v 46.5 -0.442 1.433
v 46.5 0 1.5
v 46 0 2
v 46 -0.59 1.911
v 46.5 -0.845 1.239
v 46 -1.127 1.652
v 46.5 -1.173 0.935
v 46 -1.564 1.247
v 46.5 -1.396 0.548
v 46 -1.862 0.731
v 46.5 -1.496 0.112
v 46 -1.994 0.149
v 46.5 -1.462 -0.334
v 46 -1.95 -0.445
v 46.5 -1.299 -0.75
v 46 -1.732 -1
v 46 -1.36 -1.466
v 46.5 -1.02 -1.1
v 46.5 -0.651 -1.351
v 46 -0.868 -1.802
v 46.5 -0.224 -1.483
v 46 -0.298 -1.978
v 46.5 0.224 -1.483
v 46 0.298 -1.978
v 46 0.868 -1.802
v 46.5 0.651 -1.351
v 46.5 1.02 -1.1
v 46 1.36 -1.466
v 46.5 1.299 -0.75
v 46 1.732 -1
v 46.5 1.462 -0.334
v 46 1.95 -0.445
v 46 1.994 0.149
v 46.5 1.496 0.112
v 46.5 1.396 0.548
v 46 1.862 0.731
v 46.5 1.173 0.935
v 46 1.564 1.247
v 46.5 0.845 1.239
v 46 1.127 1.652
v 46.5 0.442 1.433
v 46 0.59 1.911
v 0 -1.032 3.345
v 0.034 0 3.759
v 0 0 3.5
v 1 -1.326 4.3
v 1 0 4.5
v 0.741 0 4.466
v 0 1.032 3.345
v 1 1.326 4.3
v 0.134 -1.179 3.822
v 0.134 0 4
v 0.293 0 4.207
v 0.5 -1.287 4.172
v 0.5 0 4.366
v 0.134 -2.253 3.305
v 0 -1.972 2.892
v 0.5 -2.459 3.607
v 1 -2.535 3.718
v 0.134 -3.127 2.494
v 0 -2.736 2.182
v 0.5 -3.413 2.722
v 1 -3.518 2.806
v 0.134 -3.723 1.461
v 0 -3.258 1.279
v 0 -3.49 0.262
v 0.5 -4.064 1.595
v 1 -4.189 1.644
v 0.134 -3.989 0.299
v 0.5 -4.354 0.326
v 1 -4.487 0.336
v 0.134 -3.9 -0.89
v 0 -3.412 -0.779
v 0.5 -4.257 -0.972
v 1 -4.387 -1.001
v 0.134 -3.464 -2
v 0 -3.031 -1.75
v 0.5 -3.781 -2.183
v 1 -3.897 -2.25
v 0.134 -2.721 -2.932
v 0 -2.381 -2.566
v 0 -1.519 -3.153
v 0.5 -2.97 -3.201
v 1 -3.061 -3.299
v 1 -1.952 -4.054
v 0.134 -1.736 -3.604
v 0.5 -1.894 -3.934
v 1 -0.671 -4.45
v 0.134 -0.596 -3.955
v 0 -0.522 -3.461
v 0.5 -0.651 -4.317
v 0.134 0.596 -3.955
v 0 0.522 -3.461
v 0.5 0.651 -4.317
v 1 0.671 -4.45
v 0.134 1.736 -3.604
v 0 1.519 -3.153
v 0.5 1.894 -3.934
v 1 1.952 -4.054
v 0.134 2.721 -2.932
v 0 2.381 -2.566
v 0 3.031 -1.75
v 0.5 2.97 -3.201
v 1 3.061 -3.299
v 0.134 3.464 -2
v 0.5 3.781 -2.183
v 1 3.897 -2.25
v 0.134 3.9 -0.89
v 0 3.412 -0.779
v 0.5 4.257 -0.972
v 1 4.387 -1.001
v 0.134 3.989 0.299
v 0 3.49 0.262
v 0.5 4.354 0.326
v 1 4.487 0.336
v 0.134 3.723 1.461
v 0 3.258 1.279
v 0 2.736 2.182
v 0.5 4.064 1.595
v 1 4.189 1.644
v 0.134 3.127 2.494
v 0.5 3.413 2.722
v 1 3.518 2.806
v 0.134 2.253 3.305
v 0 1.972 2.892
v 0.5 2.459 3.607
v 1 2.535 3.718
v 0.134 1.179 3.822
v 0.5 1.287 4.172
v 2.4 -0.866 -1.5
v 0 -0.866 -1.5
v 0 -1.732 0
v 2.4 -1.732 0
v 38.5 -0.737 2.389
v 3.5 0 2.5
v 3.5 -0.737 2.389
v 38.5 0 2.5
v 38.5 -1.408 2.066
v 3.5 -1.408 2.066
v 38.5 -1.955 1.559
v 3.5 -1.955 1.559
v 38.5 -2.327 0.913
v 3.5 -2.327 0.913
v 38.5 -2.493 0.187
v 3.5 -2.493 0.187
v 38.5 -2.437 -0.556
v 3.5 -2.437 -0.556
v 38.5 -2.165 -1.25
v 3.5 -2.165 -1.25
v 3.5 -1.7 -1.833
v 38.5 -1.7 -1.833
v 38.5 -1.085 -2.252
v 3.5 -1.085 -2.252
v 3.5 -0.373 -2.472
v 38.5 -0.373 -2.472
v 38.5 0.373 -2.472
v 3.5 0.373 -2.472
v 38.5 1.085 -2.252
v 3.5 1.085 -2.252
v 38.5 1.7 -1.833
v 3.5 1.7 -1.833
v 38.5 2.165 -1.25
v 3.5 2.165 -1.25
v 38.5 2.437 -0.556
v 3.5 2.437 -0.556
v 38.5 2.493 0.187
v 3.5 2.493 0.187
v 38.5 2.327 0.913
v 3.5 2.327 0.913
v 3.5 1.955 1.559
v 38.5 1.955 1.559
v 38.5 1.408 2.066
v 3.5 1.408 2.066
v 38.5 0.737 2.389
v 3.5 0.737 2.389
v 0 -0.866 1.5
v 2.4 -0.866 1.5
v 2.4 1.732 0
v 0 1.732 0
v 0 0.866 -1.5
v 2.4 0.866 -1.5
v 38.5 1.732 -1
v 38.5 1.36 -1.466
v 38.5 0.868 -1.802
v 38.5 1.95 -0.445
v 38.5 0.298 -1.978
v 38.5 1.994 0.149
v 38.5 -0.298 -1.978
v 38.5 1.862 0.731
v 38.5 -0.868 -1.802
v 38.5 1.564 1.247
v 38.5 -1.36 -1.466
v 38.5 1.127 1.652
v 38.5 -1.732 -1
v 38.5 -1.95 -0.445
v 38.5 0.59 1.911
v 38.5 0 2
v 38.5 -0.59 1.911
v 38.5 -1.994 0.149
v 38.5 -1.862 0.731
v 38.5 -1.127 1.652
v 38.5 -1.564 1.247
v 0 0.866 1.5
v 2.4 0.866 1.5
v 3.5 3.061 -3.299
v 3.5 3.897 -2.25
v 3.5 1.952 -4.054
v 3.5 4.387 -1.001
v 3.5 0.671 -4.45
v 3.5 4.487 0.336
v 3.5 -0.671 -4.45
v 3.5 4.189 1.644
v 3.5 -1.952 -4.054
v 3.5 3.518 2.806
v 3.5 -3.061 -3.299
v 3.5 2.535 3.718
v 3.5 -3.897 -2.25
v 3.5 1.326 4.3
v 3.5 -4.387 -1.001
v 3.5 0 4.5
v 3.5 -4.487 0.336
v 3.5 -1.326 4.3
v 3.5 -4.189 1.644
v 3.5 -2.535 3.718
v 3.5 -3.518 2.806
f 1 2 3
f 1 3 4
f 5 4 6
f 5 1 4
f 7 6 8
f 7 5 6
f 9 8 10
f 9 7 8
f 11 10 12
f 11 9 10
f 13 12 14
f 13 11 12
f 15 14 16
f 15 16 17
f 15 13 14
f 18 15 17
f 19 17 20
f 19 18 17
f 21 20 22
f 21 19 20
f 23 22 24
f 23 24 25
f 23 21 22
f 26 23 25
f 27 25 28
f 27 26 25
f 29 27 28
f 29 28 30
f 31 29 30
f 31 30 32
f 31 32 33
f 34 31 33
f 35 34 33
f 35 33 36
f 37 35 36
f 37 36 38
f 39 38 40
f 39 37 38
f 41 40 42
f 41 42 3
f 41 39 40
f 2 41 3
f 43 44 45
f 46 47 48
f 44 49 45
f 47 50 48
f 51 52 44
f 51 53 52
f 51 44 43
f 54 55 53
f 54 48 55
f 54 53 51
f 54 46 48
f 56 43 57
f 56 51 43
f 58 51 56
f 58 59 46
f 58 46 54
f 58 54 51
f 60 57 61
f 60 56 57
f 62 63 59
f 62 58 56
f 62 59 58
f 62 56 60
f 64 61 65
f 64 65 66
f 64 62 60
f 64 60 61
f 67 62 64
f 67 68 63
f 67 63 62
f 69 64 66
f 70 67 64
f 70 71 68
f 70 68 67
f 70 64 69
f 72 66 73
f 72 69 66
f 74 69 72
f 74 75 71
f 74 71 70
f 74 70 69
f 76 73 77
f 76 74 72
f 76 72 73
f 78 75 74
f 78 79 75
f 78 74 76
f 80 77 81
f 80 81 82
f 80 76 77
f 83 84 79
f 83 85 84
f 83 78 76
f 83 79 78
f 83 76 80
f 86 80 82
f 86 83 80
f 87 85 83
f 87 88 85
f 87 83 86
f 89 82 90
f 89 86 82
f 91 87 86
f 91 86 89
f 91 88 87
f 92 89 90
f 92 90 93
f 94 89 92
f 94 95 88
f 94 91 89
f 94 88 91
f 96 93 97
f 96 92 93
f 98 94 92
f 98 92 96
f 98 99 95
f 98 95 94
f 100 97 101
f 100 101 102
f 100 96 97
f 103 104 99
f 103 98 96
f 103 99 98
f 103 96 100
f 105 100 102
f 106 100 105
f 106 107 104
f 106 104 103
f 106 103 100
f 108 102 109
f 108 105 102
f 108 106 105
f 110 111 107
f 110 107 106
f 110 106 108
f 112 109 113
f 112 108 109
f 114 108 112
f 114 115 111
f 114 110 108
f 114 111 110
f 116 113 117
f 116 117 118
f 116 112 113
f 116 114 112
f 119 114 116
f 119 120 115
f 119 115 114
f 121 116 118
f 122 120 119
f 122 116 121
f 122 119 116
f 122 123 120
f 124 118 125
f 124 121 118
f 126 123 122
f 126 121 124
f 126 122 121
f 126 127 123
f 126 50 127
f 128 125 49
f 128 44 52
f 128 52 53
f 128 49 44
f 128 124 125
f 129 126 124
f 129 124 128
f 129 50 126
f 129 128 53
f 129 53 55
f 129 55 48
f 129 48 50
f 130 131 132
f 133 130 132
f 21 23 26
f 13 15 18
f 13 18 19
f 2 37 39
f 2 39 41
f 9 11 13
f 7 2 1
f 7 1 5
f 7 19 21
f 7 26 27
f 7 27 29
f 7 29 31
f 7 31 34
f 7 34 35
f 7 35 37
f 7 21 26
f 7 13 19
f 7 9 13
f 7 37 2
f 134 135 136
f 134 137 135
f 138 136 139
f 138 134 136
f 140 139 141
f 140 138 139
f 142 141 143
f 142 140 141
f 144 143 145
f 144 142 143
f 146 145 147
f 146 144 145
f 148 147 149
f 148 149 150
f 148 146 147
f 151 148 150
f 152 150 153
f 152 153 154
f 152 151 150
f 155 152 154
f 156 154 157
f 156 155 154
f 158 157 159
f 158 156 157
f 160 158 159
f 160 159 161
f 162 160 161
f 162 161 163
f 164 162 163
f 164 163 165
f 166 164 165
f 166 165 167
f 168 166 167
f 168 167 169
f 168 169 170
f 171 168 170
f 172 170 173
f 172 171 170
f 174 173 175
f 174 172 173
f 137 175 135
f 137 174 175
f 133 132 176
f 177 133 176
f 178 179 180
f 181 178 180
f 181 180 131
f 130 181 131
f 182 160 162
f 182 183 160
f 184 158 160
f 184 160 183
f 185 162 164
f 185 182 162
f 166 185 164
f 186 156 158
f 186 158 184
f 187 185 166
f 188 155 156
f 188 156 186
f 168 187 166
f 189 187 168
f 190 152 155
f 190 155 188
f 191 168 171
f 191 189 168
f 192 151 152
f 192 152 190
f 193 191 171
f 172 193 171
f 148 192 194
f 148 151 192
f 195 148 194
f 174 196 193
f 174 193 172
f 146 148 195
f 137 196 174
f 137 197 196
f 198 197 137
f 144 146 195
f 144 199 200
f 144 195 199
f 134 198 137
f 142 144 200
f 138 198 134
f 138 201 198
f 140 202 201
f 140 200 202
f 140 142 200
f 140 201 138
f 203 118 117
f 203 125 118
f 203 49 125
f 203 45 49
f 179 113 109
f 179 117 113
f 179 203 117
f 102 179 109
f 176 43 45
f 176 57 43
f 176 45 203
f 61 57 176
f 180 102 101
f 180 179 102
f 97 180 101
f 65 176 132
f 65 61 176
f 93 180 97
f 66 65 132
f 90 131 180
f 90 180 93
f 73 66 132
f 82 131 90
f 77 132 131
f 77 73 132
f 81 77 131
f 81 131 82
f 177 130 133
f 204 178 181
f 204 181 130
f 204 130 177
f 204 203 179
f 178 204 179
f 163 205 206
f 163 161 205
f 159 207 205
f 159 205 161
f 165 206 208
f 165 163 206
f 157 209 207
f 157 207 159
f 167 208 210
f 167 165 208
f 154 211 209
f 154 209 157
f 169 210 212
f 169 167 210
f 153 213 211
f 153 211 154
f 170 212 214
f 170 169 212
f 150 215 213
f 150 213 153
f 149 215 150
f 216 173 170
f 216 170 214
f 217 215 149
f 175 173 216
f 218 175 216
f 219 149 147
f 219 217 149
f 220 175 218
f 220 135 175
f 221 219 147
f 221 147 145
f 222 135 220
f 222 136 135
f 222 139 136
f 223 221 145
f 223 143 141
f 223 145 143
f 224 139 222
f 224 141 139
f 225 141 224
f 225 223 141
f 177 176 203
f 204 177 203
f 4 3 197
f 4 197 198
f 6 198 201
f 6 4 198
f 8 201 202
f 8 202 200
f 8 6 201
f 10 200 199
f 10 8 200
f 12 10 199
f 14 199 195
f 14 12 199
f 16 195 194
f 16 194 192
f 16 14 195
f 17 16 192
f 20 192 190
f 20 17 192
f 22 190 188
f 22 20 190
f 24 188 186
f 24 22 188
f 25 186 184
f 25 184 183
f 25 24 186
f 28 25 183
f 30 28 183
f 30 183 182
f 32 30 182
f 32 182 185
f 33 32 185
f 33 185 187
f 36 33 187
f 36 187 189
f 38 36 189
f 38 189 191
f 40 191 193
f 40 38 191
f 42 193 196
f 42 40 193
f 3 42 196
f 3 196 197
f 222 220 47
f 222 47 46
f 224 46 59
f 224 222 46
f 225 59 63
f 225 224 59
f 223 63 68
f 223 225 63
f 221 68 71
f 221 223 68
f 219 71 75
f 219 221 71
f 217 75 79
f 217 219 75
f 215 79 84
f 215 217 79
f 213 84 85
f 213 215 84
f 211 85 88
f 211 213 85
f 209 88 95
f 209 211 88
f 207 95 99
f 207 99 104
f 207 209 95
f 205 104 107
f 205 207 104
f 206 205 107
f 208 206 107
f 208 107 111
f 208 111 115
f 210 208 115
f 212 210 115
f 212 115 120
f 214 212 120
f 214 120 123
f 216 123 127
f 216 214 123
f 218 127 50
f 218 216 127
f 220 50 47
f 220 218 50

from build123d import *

# Parameters (mm, degrees)
CUT_EXTRUDE_1_DEPTH = 2.4
FILLET_1_R          = 1
CHAMFER_1_SIZE      = 0.5


with BuildPart() as part:
    # 草图1 → 旋转1 (revolve)
    with BuildSketch(Plane.XY, mode=Mode.PRIVATE) as revolve_1_sk:
        Polygon((0, 0), (0, 4.5), (3.5, 4.5), (3.5, 2.5), (38.5, 2.5), (38.5, 2), (46.5, 2), (46.5, 0), align=None)
    revolve(revolve_1_sk.sketch.rotate(Axis((0, 0, 0), (1, 0, 0)), 90), axis=Axis((0, 0, 0), (1, 0, 0)))

    # 草图2 → 切除-拉伸1 (cut)
    with BuildSketch(Plane.ZY):
        Polygon((0, 1.732050808), (-1.5, 0.866025404), (-1.5, -0.866025404), (0, -1.732050808), (1.5, -0.866025404), (1.5, 0.866025404), align=None)
    extrude(amount=-CUT_EXTRUDE_1_DEPTH, mode=Mode.SUBTRACT)

    # 圆角1
    fillet_1_edges = [part.edges().sort_by_distance(p)[0] for p in [
        (0, 0, -4.5),
    ]]
    fillet(fillet_1_edges, radius=FILLET_1_R)

    # 倒角1
    chamfer_1_edges = [part.edges().sort_by_distance(p)[0] for p in [
        (46.5, 0, -2),
    ]]
    chamfer(chamfer_1_edges, length=CHAMFER_1_SIZE)


solid = part.part
